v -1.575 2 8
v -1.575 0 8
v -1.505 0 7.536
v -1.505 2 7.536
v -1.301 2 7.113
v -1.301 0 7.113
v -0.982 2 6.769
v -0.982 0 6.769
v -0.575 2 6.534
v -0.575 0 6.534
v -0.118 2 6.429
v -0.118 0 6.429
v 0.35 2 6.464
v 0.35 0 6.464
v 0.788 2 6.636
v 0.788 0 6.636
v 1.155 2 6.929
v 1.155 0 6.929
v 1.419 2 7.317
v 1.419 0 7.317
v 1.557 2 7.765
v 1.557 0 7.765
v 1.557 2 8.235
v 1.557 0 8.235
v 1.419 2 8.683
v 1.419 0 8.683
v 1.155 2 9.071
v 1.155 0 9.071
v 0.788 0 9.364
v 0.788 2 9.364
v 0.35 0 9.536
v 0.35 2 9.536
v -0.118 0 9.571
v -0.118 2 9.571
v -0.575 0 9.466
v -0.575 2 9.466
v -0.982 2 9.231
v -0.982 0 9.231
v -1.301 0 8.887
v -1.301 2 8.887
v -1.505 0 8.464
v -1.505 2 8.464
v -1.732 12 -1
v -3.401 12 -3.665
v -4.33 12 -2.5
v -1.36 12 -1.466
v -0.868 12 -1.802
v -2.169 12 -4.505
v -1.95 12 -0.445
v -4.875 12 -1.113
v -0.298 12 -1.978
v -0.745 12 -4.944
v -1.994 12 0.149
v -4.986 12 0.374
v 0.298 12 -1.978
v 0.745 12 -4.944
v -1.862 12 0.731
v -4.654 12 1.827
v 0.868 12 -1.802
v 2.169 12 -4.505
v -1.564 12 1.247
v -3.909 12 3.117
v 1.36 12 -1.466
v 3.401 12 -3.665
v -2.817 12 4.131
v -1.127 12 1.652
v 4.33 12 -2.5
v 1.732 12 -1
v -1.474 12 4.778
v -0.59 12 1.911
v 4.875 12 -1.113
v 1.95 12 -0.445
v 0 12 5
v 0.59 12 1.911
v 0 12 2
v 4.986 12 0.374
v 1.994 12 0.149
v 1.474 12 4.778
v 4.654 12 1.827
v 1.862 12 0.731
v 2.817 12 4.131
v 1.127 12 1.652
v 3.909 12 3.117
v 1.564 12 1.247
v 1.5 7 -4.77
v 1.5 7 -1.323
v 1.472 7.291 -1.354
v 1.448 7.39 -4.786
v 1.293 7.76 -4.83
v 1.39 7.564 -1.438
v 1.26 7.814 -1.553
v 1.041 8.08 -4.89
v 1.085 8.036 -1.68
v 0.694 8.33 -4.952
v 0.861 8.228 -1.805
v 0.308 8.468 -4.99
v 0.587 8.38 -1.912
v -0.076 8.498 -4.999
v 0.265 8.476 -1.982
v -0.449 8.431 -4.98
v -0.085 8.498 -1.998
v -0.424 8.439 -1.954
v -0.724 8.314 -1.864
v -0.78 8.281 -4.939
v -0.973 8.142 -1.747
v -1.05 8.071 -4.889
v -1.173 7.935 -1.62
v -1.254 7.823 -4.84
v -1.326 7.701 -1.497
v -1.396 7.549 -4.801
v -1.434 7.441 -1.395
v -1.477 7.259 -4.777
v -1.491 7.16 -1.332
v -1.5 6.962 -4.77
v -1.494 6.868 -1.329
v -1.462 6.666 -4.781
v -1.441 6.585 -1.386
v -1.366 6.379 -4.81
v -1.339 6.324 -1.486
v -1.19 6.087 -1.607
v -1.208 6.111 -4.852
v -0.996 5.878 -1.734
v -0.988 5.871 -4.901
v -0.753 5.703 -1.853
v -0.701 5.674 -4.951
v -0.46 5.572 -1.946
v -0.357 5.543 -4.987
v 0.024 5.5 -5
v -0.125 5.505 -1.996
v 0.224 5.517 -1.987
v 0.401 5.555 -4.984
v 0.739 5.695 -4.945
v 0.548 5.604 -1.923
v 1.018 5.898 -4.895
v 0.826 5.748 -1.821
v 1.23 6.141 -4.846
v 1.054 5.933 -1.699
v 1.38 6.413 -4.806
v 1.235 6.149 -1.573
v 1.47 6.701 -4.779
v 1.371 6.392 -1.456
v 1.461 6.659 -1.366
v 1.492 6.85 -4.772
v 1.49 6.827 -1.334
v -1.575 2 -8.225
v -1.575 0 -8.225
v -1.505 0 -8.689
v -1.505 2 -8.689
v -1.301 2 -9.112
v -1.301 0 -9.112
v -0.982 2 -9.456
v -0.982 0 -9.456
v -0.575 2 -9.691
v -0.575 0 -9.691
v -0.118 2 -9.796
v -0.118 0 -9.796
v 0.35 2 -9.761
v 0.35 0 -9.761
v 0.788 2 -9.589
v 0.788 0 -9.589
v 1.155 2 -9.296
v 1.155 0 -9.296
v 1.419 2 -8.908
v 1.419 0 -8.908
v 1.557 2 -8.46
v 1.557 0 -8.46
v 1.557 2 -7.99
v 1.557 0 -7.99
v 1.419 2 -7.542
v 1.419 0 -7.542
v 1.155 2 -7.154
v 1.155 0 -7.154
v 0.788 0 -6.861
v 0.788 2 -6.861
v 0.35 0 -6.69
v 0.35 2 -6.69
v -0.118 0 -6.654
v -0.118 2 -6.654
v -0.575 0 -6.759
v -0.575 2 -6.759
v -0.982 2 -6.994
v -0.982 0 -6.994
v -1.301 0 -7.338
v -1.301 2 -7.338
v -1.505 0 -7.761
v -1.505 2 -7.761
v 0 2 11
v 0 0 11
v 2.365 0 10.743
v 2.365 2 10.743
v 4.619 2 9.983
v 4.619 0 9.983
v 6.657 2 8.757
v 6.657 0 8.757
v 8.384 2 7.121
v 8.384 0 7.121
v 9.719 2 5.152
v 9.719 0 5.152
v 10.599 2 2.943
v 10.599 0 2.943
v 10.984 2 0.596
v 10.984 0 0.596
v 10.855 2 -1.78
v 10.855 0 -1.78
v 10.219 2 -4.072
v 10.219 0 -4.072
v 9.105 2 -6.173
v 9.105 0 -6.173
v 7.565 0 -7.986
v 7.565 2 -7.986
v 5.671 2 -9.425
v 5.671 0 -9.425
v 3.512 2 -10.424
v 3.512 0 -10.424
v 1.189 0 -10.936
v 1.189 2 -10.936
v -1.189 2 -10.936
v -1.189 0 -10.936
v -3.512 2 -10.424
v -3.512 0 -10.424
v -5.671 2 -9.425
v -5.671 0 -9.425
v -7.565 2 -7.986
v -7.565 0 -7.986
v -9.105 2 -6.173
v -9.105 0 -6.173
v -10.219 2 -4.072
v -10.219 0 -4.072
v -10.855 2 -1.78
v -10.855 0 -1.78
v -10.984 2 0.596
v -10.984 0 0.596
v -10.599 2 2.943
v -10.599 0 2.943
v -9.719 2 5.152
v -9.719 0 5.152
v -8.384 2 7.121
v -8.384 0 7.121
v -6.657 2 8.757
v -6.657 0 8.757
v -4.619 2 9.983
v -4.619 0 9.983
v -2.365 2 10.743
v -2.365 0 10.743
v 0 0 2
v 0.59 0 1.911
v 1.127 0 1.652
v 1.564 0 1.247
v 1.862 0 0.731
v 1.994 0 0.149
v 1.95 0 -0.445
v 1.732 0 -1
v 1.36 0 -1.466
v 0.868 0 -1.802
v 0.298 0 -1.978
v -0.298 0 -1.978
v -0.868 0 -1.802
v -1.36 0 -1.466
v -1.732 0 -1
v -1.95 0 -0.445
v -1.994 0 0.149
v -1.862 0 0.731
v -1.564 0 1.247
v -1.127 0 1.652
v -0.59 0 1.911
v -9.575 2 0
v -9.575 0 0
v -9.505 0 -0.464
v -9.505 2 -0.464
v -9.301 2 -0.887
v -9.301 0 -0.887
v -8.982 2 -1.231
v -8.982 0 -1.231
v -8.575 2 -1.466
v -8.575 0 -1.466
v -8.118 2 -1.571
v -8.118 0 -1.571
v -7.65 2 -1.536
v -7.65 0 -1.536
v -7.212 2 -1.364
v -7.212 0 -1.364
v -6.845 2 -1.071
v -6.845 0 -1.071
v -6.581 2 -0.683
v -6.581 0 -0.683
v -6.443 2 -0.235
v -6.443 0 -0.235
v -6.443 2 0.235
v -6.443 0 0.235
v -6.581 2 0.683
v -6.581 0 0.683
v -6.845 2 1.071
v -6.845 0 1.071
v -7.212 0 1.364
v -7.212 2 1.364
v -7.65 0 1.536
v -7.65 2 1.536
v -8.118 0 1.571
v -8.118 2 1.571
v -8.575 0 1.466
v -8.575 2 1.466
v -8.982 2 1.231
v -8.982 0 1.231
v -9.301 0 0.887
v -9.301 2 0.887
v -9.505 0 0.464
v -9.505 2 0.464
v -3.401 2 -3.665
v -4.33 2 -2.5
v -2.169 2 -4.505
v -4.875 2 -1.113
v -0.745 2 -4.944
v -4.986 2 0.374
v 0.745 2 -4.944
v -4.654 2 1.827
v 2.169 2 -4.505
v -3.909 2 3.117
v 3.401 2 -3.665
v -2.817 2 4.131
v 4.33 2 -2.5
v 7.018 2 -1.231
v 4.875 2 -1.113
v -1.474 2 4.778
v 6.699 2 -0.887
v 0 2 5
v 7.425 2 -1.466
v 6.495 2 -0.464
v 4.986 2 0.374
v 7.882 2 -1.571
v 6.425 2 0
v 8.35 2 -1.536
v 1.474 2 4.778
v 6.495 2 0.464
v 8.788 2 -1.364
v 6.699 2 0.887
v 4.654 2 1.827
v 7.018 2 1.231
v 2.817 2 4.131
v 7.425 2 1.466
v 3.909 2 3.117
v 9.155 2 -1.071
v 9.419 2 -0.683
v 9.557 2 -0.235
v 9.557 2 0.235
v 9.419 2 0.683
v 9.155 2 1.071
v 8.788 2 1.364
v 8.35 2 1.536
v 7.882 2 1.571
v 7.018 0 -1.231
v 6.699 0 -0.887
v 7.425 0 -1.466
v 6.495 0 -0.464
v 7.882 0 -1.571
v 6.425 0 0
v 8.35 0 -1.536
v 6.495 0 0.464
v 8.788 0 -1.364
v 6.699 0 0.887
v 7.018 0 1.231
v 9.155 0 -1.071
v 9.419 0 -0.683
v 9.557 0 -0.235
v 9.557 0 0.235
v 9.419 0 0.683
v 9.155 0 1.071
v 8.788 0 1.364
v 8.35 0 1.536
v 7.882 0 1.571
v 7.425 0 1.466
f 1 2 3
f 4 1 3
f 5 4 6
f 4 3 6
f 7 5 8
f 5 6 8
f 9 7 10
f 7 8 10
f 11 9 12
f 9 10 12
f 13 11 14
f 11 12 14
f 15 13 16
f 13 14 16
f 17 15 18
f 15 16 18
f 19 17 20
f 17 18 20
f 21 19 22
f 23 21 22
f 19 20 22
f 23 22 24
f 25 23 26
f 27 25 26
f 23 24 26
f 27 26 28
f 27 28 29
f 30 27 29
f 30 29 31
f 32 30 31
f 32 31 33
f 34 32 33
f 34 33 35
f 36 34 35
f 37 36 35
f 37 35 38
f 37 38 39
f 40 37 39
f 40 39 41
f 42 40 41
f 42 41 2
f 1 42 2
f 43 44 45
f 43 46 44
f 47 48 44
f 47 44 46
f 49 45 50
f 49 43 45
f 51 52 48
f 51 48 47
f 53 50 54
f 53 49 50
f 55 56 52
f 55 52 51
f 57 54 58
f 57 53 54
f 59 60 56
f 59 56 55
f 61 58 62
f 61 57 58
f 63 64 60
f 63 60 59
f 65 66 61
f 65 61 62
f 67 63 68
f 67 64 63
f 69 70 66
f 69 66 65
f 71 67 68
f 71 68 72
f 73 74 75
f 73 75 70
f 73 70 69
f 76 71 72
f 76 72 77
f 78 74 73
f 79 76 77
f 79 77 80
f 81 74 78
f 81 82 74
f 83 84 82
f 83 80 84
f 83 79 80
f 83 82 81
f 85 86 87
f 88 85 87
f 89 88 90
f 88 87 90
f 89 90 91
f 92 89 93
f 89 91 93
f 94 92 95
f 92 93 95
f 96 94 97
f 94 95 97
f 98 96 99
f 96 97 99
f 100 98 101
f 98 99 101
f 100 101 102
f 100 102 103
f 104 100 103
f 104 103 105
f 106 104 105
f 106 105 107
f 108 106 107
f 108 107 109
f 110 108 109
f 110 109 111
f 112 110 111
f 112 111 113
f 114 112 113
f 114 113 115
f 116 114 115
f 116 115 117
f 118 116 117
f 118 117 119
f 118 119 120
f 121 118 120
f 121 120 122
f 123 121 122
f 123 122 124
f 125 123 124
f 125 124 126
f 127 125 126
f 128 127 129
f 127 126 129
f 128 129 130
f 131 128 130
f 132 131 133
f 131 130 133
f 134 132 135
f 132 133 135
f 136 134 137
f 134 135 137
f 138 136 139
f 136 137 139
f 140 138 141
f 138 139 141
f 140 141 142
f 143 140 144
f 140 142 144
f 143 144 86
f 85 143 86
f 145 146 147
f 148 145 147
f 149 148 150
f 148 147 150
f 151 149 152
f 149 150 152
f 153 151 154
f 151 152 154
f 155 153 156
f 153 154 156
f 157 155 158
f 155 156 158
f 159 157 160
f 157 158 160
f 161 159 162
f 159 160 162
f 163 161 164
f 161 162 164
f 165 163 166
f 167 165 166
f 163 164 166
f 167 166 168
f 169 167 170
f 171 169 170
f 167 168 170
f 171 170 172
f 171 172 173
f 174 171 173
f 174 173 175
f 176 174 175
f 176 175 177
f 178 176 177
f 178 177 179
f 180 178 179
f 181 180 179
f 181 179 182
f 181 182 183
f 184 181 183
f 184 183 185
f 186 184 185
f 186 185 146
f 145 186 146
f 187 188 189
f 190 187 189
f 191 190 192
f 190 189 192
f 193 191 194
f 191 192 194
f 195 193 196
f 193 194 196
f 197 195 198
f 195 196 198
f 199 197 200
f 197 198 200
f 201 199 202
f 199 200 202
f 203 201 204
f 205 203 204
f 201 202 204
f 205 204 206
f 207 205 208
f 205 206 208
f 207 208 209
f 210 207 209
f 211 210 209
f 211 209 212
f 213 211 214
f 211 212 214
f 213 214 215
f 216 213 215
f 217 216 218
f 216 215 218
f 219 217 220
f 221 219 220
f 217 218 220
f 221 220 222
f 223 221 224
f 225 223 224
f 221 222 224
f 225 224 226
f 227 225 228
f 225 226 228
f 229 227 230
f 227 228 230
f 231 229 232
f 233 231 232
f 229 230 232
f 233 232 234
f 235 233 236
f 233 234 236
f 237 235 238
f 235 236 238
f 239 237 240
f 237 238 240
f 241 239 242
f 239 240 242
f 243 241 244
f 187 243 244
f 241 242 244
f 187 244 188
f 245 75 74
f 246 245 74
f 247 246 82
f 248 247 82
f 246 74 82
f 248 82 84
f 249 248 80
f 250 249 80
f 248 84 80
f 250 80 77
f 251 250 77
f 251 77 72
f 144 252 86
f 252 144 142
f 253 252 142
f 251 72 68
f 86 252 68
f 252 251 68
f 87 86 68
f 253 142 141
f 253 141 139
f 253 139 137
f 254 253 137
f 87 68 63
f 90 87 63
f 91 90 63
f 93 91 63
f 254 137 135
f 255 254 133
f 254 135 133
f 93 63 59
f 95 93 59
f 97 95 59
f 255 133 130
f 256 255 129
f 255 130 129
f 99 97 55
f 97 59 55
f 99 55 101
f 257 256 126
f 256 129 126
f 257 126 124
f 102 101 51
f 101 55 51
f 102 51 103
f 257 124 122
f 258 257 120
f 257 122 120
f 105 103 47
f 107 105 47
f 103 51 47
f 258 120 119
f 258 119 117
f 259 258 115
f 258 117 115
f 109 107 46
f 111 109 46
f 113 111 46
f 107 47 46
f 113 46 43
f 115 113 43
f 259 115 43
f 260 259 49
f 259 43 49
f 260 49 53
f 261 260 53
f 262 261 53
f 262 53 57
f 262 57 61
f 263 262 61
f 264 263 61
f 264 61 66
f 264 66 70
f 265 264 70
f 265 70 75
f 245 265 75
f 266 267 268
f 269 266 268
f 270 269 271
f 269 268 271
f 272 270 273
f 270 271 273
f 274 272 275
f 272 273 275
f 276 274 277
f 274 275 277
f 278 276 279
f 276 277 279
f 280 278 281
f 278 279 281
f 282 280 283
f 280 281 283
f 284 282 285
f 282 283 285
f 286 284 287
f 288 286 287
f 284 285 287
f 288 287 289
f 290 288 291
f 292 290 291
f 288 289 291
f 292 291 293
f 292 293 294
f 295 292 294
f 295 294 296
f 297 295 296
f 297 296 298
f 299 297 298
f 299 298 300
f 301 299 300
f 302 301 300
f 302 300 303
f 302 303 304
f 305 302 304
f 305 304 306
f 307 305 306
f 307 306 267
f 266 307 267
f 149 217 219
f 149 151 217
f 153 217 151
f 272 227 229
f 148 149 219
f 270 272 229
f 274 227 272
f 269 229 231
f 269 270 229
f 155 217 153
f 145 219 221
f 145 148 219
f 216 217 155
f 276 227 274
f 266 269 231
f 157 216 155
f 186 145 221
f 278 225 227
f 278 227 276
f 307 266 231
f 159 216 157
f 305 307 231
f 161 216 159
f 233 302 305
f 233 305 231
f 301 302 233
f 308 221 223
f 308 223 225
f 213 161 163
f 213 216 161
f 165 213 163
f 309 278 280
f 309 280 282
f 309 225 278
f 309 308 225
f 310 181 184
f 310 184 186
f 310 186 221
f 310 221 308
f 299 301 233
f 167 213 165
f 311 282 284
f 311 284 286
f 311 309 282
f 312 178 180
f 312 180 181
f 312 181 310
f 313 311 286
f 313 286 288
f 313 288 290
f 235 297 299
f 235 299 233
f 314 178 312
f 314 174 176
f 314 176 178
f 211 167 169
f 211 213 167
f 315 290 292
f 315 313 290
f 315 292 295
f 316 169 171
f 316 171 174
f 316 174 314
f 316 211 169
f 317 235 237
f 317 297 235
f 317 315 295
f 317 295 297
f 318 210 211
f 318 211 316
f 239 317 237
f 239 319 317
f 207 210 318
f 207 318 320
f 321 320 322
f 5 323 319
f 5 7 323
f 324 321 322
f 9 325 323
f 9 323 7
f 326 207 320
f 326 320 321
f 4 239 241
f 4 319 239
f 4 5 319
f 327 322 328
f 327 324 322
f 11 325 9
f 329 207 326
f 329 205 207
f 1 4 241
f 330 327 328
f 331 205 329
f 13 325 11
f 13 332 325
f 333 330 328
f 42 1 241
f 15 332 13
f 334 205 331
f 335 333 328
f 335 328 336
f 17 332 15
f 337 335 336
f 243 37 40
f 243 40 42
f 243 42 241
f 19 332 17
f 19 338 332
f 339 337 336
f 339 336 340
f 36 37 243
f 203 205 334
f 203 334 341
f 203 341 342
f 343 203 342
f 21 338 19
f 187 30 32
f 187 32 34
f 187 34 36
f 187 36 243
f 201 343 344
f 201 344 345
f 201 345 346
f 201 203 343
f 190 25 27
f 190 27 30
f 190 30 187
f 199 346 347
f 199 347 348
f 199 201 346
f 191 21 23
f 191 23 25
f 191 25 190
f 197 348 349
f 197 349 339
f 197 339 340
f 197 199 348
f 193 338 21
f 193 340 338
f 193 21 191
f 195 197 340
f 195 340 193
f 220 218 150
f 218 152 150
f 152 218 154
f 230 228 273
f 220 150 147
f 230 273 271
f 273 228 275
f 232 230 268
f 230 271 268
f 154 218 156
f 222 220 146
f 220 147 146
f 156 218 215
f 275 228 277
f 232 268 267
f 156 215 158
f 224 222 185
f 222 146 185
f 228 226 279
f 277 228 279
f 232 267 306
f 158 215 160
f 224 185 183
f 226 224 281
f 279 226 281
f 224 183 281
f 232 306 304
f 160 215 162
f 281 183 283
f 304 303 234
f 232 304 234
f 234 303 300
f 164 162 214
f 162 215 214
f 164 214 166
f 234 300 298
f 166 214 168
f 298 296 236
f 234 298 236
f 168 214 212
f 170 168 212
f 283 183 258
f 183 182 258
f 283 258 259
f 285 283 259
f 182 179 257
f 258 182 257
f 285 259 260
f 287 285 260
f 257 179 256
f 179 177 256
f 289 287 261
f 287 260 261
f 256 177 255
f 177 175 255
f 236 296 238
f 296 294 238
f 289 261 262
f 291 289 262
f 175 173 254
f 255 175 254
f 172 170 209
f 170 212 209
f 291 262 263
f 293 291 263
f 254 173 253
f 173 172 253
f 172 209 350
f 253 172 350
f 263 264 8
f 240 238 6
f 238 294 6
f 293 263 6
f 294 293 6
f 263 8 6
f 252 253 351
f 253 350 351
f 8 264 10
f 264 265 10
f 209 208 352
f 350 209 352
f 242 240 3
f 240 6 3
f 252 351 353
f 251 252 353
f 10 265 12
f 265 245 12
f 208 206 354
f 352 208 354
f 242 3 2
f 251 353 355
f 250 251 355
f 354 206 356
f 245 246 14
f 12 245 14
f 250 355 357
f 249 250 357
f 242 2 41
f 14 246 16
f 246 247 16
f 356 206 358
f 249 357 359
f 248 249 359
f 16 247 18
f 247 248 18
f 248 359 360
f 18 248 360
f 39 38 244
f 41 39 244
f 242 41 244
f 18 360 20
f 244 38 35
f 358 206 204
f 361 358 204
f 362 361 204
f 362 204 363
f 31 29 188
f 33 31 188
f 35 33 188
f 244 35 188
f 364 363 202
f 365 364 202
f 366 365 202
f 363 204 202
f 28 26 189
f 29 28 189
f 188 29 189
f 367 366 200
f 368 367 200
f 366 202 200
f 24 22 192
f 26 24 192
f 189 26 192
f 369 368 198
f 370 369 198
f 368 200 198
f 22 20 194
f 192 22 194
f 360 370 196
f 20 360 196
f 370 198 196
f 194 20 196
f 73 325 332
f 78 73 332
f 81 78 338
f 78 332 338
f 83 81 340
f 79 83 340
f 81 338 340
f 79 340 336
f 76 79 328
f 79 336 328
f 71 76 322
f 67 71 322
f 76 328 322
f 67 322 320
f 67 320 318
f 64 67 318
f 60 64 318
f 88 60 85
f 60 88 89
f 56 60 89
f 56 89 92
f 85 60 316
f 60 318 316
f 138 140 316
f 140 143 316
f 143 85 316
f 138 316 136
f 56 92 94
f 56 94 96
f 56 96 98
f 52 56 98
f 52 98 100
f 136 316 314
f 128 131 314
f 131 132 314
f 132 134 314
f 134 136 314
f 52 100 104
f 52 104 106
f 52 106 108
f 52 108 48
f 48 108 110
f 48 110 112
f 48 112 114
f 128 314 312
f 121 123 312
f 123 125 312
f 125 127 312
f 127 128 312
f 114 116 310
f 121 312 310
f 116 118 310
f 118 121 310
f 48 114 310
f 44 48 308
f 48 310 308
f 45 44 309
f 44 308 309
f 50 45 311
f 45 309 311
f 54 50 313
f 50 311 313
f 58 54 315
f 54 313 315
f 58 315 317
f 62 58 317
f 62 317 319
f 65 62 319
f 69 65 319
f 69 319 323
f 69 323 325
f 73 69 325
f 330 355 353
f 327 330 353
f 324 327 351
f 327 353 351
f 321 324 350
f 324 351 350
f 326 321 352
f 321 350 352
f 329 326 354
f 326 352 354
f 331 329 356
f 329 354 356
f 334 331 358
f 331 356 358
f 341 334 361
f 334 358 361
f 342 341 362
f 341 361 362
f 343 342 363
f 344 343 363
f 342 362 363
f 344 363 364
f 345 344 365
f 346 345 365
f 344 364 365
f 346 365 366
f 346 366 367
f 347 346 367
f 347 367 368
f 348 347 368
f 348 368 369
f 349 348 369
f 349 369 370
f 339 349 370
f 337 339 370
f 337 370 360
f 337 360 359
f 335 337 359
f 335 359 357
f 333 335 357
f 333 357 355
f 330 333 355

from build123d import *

# Parameters (mm, degrees)
SKETCH_2_R            = 11
EXTRUDE_1_DEPTH       = 2
SKETCH_7_R            = 5
EXTRUDE_2_DEPTH       = 10
CUT_EXTRUDE_3_REACH   = 21.647
SKETCH_8_R            = 2
HOLE_WIZARD_M31_D     = 3.15
HOLE_WIZARD_M31_DEPTH = 8
HOLE_WIZARD_M31_TIP   = 0.946355475
SKETCH_12_R           = 1.5
CUT_EXTRUDE_4_DEPTH   = 10


with BuildPart() as part:
    # Эскиз2 → Бобышка-Вытянуть1 (new body)
    with BuildSketch(Plane(origin=(0, 0, 0), x_dir=(1, 0, 0), z_dir=(0, 1, 0))):
        with Locations(Location((0, 0, 0), (0, 0, 270))):
            Circle(SKETCH_2_R)
    extrude(amount=EXTRUDE_1_DEPTH)

    # Эскиз7 → Бобышка-Вытянуть2 (add)
    with BuildSketch(Plane(origin=(0, 2, 0), x_dir=(1, 0, 0), z_dir=(0, 1, 0))):
        with Locations(Location((0, 0, 0), (0, 0, 270))):
            Circle(SKETCH_7_R)
    extrude(amount=EXTRUDE_2_DEPTH)

    # Эскиз8 → Вырез-Вытянуть3 (cut, up to next)
    with BuildSketch(Plane(origin=(0, 12, 0), x_dir=(1, 0, 0), z_dir=(0, 1, 0)), mode=Mode.PRIVATE) as cut_extrude_3_sk1:
        with Locations(Location((0, 0, 0), (0, 0, 270))):
            Circle(SKETCH_8_R)
    cut_extrude_3_tool1 = extrude(cut_extrude_3_sk1.sketch, amount=-CUT_EXTRUDE_3_REACH, mode=Mode.PRIVATE) & part.part
    add(cut_extrude_3_tool1.solids().sort_by_distance((0, 12, 0))[0], mode=Mode.SUBTRACT)

    # Сверло под метчик  спиральное M31
    with Locations(Plane(origin=(0, 2, 0), x_dir=(1, 0, 0), z_dir=(0, 1, 0))):
        with Locations((0, -8), (-8, 0), (0, 8.225054206), (8, 0)):
            Hole(HOLE_WIZARD_M31_D / 2, depth=HOLE_WIZARD_M31_DEPTH)
            with Locations((0, 0, -(HOLE_WIZARD_M31_DEPTH + HOLE_WIZARD_M31_TIP / 2))):  # 118° drill point
                Cone(0, HOLE_WIZARD_M31_D / 2, HOLE_WIZARD_M31_TIP, mode=Mode.SUBTRACT)

    # Эскиз12 → Вырез-Вытянуть4 (cut)
    with BuildSketch(Plane.XY):
        with Locations((0, 7)):
            Circle(SKETCH_12_R)
    extrude(amount=-CUT_EXTRUDE_4_DEPTH, mode=Mode.SUBTRACT)


solid = part.part
